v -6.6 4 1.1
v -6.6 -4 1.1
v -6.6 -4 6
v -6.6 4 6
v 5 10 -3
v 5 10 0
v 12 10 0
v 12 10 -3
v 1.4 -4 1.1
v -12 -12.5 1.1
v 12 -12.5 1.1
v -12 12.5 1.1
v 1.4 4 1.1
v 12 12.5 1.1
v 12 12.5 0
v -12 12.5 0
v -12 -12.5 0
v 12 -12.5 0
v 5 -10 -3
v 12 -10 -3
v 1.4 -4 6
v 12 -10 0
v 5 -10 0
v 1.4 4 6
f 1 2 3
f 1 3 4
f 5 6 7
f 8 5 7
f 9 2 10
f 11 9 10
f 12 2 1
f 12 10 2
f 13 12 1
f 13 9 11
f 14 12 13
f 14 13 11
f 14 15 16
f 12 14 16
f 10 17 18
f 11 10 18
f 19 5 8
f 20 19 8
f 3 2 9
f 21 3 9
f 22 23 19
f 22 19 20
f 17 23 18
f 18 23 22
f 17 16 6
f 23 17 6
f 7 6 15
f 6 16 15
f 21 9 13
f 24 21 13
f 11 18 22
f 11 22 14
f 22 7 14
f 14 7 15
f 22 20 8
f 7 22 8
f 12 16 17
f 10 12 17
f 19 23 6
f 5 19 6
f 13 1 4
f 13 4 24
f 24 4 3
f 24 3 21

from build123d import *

# Parameters (mm, degrees)
F0_W     = 8
F0_H     = 8
F0_W_2   = 7
F0_H_2   = 20
F1_DEPTH = 1.1
F2_DEPTH = 6
F3_DEPTH = 3


with BuildPart() as f1:
    # F0 (on Top) → F1 (new body)
    with BuildSketch(Plane.XY):
        Polygon((12, 12.5), (-12, 12.5), (-12, -12.5), (12, -12.5), (12, -10), (5, -10), (5, 10), (12, 10), align=None)
        with Locations((-2.6, 0)):
            Rectangle(F0_W, F0_H, mode=Mode.SUBTRACT)
        with Locations((-2.6, 0)):
            Rectangle(F0_W, F0_H)
        with Locations((8.5, 0)):
            Rectangle(F0_W_2, F0_H_2)
    extrude(amount=F1_DEPTH)

    # F0 (on Top) → F2 (join)
    with BuildSketch(Plane.XY):
        with Locations((-2.6, 0)):
            Rectangle(F0_W, F0_H)
    extrude(amount=F2_DEPTH)

    # F0 (on Top) → F3 (join)
    with BuildSketch(Plane.XY):
        with Locations((8.5, 0)):
            Rectangle(F0_W_2, F0_H_2)
    extrude(amount=-F3_DEPTH)


solid = f1.part
